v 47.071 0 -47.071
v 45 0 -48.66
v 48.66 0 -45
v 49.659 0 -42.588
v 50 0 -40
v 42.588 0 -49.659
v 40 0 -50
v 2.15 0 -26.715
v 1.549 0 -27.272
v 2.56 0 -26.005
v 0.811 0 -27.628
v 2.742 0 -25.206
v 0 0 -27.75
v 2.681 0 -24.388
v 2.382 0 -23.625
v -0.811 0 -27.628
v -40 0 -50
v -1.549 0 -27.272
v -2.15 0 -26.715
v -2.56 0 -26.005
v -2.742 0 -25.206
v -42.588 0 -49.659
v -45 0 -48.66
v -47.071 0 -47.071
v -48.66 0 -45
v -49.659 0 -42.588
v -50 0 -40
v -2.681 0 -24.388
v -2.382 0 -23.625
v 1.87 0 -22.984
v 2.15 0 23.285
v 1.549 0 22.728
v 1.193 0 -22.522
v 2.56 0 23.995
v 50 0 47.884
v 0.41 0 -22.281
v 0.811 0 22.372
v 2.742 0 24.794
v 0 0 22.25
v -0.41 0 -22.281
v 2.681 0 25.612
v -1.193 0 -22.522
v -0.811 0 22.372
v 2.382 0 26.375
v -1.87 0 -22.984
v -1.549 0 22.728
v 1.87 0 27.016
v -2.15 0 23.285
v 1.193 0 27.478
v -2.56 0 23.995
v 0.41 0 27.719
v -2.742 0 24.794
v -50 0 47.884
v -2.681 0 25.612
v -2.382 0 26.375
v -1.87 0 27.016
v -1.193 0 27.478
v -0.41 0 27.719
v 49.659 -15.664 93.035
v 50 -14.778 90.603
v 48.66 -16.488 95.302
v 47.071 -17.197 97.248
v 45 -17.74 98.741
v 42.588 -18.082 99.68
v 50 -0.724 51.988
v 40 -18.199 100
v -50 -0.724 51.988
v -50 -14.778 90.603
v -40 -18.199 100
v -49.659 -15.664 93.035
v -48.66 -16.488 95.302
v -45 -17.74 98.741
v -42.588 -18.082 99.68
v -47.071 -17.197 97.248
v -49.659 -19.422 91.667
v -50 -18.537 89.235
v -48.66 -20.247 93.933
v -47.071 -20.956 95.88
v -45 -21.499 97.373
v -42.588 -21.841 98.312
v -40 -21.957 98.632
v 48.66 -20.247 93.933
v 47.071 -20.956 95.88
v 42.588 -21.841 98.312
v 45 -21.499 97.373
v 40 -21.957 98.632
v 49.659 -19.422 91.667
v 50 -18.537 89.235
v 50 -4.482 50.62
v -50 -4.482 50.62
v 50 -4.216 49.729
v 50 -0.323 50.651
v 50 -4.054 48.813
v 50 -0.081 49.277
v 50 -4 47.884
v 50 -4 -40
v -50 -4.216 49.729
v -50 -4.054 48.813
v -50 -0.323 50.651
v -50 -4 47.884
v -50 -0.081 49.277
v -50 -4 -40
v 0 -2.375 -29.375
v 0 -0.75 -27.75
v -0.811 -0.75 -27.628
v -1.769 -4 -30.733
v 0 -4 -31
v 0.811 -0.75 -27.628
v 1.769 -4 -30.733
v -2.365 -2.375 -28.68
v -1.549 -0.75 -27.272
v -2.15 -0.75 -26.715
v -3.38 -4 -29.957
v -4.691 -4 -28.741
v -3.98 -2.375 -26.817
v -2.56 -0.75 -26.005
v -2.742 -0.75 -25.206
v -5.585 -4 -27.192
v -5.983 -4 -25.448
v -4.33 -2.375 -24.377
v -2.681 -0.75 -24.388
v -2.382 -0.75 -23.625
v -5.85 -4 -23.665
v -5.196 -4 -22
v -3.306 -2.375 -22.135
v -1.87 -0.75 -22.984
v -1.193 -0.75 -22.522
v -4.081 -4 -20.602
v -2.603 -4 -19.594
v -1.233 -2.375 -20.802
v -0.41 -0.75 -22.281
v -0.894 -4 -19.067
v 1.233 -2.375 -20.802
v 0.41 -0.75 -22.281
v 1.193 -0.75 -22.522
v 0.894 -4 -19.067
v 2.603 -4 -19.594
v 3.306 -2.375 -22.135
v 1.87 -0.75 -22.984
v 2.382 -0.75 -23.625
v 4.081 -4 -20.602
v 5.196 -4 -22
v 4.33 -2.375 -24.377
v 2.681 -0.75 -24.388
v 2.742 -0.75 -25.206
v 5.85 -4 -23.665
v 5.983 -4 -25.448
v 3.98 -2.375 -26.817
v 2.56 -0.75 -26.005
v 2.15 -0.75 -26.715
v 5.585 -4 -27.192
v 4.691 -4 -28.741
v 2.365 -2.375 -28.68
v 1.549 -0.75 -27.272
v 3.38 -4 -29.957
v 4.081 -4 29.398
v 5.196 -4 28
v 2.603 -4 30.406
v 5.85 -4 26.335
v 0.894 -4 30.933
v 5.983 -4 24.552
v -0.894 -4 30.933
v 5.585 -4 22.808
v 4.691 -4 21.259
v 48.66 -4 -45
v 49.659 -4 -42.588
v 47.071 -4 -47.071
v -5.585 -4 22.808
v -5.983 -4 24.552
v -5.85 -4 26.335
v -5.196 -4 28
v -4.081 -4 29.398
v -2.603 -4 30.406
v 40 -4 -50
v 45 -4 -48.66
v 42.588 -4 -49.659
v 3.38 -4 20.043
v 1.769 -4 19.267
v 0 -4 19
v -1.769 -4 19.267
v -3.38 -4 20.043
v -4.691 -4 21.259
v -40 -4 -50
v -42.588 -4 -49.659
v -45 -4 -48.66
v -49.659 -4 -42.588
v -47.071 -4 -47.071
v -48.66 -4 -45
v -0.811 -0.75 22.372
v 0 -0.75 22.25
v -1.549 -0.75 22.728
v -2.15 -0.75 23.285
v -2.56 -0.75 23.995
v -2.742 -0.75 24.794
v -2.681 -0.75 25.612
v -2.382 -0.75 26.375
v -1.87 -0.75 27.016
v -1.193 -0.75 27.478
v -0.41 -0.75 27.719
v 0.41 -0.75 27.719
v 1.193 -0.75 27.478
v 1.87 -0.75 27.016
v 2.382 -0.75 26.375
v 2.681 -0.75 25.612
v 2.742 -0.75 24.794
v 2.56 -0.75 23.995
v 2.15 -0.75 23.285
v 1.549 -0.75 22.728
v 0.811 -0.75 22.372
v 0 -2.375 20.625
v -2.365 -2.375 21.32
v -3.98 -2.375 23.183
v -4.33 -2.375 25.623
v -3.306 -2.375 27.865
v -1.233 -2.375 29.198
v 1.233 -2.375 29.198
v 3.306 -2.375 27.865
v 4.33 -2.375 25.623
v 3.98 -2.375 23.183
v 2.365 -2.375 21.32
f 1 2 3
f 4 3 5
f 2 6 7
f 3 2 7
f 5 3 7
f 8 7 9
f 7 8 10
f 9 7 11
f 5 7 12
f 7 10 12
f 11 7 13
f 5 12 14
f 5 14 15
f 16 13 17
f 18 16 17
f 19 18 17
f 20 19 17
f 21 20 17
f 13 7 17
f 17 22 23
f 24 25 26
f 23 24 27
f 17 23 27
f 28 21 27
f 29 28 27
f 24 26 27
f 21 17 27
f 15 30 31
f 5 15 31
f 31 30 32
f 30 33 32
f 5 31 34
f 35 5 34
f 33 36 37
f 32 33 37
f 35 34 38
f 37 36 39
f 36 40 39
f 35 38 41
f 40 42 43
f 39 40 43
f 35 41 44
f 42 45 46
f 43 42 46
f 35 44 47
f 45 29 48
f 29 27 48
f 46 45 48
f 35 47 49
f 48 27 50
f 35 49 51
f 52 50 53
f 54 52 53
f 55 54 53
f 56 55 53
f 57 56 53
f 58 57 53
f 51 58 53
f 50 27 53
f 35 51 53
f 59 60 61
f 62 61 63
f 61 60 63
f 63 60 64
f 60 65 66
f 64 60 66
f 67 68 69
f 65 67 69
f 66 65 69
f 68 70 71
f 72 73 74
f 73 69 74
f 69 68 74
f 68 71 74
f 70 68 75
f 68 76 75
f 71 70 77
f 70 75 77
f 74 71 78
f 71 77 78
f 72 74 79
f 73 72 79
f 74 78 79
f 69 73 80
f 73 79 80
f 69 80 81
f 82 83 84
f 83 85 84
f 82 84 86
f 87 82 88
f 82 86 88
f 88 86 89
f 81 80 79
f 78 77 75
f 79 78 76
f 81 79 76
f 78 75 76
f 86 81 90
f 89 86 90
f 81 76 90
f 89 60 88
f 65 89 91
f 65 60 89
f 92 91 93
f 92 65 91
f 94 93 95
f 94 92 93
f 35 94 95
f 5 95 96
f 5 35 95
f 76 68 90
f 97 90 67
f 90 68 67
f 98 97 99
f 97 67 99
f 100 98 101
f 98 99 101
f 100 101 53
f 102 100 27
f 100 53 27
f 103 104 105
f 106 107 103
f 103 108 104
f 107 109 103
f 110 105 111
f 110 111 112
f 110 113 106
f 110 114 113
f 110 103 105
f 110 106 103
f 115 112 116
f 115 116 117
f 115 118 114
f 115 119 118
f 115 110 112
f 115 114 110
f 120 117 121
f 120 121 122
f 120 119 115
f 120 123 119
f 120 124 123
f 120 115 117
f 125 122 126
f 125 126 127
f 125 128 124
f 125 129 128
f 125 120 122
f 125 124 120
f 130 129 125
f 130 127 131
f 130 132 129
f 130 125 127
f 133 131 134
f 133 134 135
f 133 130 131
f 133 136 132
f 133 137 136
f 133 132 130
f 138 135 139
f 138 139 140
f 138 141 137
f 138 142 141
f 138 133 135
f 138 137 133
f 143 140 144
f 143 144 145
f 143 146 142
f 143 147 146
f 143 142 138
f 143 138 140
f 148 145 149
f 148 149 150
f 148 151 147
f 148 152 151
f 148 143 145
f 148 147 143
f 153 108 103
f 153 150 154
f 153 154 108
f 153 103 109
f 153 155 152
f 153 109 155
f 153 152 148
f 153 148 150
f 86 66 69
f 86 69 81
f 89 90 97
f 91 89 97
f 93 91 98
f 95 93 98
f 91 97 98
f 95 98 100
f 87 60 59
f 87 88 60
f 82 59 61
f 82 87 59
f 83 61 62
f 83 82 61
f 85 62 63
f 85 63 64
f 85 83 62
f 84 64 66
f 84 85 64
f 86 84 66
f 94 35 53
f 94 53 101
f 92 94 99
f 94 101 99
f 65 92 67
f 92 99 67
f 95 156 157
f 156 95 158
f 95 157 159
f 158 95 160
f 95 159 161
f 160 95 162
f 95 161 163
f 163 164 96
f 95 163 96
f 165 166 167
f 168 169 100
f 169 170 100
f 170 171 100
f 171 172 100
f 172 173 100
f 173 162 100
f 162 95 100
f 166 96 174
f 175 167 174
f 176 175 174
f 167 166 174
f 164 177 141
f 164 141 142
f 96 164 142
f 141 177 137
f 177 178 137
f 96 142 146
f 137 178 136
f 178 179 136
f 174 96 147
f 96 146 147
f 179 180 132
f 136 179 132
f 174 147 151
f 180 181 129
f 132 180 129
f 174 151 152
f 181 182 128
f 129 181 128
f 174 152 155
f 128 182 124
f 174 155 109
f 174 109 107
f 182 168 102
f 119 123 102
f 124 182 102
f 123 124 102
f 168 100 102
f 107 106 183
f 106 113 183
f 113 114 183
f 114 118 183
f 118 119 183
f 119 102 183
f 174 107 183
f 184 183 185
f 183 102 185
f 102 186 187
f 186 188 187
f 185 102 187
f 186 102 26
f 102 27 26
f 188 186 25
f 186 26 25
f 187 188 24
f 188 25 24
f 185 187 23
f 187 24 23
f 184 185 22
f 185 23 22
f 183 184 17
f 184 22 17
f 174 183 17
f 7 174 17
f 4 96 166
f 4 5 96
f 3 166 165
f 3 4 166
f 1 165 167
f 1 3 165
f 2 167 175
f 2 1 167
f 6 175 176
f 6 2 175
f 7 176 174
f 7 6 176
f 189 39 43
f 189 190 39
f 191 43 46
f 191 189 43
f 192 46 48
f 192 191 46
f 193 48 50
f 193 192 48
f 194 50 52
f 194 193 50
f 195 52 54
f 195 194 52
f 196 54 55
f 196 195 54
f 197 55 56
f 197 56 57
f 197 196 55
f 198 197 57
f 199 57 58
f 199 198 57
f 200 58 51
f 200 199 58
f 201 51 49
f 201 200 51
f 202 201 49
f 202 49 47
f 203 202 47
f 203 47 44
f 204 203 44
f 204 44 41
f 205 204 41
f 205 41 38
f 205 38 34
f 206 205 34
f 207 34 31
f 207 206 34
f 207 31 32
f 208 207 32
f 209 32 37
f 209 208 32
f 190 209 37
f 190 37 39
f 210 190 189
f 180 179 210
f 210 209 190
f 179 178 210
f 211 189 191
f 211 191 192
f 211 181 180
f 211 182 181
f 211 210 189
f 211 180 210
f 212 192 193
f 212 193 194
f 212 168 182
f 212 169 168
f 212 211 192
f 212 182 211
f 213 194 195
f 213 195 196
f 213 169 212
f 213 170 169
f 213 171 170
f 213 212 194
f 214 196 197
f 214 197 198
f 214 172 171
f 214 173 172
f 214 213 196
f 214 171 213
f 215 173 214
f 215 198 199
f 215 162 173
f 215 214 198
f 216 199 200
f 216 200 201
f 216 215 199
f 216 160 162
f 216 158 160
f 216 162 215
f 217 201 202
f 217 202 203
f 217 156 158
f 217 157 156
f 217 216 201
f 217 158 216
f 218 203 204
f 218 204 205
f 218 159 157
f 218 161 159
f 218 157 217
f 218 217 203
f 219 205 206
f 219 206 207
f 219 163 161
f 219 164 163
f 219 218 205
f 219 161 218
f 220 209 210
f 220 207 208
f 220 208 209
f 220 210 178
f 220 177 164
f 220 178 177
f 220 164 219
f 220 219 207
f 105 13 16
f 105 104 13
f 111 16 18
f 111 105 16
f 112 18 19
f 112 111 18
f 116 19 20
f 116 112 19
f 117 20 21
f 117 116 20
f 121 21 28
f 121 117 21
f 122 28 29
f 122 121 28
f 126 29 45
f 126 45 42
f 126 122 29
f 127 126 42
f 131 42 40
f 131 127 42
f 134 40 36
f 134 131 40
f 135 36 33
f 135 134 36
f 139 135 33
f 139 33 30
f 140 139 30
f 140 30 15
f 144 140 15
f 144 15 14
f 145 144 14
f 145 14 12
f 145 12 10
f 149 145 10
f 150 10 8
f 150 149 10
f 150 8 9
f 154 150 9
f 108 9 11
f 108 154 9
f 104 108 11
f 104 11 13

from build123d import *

# Parameters (mm, degrees)
BASE_FLANGE1_START                           = -50
BASE_FLANGE1_DEPTH                           = 100
CSK_FOR_M5_COUNTERSUNK_FLAT_HEAD_SCR_2_COUNT = 2
CSK_FOR_M5_COUNTERSUNK_FLAT_HEAD_SCR_2_PITCH = 50
FILLET1_R                                    = 10


# Read off the part's stored shape, not the designer's step: Base-Flange1
with BuildPart() as part:
    # Base-Flange1 outline → Base-Flange1 (new body)
    with BuildSketch(Plane(origin=(0, 0, 0), x_dir=(0, 0, -1), z_dir=(1, 0, 0)).offset(BASE_FLANGE1_START)):
        with BuildLine():
            Line((-47.884076231, -4), (50, -4))
            Line((50, -4), (50, 0))
            Line((50, 0), (-47.884076231, 0))
            ThreePointArc((-47.884076231, 0), (-49.967854363, -0.182306964), (-51.988317951, -0.723688551))
            Line((-51.988317951, -0.723688551), (-100, -18.198511713))
            Line((-100, -18.198511713), (-98.631919427, -21.957282196))
            Line((-98.631919427, -21.957282196), (-50.620237378, -4.482459034))
            ThreePointArc((-50.620237378, -4.482459034), (-49.273261653, -4.121537976), (-47.884076231, -4))
        make_face()
    extrude(amount=BASE_FLANGE1_DEPTH)

    # Sketch8 → CSK for M5 Countersunk Flat Head Screw1 (revolve, cut)
    with BuildSketch(Plane(origin=(0, -4, 25), x_dir=(0, 0, -1), z_dir=(1, 0, 0))):
        Polygon((0, 0), (0, 4), (2.75, 4), (2.75, 3.25), (6, 0), align=None)
    csk_for_m5_countersunk_flat_head_screw1 = revolve(axis=Axis((0, -10.35, 25), (0, 1, 0)), mode=Mode.SUBTRACT)

    # CSK for M5 Countersunk Flat Head Scr 2: CSK for M5 Countersunk Flat Head Screw1 ×2
    with Locations(*[(0, 0, -i * CSK_FOR_M5_COUNTERSUNK_FLAT_HEAD_SCR_2_PITCH) for i in range(1, CSK_FOR_M5_COUNTERSUNK_FLAT_HEAD_SCR_2_COUNT)]):
        add(csk_for_m5_countersunk_flat_head_screw1, mode=Mode.SUBTRACT)

    # Fillet1
    fillet1_edges = [part.edges().sort_by_distance(p)[0] for p in [
        (50, -20.077896954, 99.315959714),
        (50, -2, -50),
        (-50, -20.077896954, 99.315959714),
        (-50, -2, -50),
    ]]
    fillet(fillet1_edges, radius=FILLET1_R)


solid = part.part
